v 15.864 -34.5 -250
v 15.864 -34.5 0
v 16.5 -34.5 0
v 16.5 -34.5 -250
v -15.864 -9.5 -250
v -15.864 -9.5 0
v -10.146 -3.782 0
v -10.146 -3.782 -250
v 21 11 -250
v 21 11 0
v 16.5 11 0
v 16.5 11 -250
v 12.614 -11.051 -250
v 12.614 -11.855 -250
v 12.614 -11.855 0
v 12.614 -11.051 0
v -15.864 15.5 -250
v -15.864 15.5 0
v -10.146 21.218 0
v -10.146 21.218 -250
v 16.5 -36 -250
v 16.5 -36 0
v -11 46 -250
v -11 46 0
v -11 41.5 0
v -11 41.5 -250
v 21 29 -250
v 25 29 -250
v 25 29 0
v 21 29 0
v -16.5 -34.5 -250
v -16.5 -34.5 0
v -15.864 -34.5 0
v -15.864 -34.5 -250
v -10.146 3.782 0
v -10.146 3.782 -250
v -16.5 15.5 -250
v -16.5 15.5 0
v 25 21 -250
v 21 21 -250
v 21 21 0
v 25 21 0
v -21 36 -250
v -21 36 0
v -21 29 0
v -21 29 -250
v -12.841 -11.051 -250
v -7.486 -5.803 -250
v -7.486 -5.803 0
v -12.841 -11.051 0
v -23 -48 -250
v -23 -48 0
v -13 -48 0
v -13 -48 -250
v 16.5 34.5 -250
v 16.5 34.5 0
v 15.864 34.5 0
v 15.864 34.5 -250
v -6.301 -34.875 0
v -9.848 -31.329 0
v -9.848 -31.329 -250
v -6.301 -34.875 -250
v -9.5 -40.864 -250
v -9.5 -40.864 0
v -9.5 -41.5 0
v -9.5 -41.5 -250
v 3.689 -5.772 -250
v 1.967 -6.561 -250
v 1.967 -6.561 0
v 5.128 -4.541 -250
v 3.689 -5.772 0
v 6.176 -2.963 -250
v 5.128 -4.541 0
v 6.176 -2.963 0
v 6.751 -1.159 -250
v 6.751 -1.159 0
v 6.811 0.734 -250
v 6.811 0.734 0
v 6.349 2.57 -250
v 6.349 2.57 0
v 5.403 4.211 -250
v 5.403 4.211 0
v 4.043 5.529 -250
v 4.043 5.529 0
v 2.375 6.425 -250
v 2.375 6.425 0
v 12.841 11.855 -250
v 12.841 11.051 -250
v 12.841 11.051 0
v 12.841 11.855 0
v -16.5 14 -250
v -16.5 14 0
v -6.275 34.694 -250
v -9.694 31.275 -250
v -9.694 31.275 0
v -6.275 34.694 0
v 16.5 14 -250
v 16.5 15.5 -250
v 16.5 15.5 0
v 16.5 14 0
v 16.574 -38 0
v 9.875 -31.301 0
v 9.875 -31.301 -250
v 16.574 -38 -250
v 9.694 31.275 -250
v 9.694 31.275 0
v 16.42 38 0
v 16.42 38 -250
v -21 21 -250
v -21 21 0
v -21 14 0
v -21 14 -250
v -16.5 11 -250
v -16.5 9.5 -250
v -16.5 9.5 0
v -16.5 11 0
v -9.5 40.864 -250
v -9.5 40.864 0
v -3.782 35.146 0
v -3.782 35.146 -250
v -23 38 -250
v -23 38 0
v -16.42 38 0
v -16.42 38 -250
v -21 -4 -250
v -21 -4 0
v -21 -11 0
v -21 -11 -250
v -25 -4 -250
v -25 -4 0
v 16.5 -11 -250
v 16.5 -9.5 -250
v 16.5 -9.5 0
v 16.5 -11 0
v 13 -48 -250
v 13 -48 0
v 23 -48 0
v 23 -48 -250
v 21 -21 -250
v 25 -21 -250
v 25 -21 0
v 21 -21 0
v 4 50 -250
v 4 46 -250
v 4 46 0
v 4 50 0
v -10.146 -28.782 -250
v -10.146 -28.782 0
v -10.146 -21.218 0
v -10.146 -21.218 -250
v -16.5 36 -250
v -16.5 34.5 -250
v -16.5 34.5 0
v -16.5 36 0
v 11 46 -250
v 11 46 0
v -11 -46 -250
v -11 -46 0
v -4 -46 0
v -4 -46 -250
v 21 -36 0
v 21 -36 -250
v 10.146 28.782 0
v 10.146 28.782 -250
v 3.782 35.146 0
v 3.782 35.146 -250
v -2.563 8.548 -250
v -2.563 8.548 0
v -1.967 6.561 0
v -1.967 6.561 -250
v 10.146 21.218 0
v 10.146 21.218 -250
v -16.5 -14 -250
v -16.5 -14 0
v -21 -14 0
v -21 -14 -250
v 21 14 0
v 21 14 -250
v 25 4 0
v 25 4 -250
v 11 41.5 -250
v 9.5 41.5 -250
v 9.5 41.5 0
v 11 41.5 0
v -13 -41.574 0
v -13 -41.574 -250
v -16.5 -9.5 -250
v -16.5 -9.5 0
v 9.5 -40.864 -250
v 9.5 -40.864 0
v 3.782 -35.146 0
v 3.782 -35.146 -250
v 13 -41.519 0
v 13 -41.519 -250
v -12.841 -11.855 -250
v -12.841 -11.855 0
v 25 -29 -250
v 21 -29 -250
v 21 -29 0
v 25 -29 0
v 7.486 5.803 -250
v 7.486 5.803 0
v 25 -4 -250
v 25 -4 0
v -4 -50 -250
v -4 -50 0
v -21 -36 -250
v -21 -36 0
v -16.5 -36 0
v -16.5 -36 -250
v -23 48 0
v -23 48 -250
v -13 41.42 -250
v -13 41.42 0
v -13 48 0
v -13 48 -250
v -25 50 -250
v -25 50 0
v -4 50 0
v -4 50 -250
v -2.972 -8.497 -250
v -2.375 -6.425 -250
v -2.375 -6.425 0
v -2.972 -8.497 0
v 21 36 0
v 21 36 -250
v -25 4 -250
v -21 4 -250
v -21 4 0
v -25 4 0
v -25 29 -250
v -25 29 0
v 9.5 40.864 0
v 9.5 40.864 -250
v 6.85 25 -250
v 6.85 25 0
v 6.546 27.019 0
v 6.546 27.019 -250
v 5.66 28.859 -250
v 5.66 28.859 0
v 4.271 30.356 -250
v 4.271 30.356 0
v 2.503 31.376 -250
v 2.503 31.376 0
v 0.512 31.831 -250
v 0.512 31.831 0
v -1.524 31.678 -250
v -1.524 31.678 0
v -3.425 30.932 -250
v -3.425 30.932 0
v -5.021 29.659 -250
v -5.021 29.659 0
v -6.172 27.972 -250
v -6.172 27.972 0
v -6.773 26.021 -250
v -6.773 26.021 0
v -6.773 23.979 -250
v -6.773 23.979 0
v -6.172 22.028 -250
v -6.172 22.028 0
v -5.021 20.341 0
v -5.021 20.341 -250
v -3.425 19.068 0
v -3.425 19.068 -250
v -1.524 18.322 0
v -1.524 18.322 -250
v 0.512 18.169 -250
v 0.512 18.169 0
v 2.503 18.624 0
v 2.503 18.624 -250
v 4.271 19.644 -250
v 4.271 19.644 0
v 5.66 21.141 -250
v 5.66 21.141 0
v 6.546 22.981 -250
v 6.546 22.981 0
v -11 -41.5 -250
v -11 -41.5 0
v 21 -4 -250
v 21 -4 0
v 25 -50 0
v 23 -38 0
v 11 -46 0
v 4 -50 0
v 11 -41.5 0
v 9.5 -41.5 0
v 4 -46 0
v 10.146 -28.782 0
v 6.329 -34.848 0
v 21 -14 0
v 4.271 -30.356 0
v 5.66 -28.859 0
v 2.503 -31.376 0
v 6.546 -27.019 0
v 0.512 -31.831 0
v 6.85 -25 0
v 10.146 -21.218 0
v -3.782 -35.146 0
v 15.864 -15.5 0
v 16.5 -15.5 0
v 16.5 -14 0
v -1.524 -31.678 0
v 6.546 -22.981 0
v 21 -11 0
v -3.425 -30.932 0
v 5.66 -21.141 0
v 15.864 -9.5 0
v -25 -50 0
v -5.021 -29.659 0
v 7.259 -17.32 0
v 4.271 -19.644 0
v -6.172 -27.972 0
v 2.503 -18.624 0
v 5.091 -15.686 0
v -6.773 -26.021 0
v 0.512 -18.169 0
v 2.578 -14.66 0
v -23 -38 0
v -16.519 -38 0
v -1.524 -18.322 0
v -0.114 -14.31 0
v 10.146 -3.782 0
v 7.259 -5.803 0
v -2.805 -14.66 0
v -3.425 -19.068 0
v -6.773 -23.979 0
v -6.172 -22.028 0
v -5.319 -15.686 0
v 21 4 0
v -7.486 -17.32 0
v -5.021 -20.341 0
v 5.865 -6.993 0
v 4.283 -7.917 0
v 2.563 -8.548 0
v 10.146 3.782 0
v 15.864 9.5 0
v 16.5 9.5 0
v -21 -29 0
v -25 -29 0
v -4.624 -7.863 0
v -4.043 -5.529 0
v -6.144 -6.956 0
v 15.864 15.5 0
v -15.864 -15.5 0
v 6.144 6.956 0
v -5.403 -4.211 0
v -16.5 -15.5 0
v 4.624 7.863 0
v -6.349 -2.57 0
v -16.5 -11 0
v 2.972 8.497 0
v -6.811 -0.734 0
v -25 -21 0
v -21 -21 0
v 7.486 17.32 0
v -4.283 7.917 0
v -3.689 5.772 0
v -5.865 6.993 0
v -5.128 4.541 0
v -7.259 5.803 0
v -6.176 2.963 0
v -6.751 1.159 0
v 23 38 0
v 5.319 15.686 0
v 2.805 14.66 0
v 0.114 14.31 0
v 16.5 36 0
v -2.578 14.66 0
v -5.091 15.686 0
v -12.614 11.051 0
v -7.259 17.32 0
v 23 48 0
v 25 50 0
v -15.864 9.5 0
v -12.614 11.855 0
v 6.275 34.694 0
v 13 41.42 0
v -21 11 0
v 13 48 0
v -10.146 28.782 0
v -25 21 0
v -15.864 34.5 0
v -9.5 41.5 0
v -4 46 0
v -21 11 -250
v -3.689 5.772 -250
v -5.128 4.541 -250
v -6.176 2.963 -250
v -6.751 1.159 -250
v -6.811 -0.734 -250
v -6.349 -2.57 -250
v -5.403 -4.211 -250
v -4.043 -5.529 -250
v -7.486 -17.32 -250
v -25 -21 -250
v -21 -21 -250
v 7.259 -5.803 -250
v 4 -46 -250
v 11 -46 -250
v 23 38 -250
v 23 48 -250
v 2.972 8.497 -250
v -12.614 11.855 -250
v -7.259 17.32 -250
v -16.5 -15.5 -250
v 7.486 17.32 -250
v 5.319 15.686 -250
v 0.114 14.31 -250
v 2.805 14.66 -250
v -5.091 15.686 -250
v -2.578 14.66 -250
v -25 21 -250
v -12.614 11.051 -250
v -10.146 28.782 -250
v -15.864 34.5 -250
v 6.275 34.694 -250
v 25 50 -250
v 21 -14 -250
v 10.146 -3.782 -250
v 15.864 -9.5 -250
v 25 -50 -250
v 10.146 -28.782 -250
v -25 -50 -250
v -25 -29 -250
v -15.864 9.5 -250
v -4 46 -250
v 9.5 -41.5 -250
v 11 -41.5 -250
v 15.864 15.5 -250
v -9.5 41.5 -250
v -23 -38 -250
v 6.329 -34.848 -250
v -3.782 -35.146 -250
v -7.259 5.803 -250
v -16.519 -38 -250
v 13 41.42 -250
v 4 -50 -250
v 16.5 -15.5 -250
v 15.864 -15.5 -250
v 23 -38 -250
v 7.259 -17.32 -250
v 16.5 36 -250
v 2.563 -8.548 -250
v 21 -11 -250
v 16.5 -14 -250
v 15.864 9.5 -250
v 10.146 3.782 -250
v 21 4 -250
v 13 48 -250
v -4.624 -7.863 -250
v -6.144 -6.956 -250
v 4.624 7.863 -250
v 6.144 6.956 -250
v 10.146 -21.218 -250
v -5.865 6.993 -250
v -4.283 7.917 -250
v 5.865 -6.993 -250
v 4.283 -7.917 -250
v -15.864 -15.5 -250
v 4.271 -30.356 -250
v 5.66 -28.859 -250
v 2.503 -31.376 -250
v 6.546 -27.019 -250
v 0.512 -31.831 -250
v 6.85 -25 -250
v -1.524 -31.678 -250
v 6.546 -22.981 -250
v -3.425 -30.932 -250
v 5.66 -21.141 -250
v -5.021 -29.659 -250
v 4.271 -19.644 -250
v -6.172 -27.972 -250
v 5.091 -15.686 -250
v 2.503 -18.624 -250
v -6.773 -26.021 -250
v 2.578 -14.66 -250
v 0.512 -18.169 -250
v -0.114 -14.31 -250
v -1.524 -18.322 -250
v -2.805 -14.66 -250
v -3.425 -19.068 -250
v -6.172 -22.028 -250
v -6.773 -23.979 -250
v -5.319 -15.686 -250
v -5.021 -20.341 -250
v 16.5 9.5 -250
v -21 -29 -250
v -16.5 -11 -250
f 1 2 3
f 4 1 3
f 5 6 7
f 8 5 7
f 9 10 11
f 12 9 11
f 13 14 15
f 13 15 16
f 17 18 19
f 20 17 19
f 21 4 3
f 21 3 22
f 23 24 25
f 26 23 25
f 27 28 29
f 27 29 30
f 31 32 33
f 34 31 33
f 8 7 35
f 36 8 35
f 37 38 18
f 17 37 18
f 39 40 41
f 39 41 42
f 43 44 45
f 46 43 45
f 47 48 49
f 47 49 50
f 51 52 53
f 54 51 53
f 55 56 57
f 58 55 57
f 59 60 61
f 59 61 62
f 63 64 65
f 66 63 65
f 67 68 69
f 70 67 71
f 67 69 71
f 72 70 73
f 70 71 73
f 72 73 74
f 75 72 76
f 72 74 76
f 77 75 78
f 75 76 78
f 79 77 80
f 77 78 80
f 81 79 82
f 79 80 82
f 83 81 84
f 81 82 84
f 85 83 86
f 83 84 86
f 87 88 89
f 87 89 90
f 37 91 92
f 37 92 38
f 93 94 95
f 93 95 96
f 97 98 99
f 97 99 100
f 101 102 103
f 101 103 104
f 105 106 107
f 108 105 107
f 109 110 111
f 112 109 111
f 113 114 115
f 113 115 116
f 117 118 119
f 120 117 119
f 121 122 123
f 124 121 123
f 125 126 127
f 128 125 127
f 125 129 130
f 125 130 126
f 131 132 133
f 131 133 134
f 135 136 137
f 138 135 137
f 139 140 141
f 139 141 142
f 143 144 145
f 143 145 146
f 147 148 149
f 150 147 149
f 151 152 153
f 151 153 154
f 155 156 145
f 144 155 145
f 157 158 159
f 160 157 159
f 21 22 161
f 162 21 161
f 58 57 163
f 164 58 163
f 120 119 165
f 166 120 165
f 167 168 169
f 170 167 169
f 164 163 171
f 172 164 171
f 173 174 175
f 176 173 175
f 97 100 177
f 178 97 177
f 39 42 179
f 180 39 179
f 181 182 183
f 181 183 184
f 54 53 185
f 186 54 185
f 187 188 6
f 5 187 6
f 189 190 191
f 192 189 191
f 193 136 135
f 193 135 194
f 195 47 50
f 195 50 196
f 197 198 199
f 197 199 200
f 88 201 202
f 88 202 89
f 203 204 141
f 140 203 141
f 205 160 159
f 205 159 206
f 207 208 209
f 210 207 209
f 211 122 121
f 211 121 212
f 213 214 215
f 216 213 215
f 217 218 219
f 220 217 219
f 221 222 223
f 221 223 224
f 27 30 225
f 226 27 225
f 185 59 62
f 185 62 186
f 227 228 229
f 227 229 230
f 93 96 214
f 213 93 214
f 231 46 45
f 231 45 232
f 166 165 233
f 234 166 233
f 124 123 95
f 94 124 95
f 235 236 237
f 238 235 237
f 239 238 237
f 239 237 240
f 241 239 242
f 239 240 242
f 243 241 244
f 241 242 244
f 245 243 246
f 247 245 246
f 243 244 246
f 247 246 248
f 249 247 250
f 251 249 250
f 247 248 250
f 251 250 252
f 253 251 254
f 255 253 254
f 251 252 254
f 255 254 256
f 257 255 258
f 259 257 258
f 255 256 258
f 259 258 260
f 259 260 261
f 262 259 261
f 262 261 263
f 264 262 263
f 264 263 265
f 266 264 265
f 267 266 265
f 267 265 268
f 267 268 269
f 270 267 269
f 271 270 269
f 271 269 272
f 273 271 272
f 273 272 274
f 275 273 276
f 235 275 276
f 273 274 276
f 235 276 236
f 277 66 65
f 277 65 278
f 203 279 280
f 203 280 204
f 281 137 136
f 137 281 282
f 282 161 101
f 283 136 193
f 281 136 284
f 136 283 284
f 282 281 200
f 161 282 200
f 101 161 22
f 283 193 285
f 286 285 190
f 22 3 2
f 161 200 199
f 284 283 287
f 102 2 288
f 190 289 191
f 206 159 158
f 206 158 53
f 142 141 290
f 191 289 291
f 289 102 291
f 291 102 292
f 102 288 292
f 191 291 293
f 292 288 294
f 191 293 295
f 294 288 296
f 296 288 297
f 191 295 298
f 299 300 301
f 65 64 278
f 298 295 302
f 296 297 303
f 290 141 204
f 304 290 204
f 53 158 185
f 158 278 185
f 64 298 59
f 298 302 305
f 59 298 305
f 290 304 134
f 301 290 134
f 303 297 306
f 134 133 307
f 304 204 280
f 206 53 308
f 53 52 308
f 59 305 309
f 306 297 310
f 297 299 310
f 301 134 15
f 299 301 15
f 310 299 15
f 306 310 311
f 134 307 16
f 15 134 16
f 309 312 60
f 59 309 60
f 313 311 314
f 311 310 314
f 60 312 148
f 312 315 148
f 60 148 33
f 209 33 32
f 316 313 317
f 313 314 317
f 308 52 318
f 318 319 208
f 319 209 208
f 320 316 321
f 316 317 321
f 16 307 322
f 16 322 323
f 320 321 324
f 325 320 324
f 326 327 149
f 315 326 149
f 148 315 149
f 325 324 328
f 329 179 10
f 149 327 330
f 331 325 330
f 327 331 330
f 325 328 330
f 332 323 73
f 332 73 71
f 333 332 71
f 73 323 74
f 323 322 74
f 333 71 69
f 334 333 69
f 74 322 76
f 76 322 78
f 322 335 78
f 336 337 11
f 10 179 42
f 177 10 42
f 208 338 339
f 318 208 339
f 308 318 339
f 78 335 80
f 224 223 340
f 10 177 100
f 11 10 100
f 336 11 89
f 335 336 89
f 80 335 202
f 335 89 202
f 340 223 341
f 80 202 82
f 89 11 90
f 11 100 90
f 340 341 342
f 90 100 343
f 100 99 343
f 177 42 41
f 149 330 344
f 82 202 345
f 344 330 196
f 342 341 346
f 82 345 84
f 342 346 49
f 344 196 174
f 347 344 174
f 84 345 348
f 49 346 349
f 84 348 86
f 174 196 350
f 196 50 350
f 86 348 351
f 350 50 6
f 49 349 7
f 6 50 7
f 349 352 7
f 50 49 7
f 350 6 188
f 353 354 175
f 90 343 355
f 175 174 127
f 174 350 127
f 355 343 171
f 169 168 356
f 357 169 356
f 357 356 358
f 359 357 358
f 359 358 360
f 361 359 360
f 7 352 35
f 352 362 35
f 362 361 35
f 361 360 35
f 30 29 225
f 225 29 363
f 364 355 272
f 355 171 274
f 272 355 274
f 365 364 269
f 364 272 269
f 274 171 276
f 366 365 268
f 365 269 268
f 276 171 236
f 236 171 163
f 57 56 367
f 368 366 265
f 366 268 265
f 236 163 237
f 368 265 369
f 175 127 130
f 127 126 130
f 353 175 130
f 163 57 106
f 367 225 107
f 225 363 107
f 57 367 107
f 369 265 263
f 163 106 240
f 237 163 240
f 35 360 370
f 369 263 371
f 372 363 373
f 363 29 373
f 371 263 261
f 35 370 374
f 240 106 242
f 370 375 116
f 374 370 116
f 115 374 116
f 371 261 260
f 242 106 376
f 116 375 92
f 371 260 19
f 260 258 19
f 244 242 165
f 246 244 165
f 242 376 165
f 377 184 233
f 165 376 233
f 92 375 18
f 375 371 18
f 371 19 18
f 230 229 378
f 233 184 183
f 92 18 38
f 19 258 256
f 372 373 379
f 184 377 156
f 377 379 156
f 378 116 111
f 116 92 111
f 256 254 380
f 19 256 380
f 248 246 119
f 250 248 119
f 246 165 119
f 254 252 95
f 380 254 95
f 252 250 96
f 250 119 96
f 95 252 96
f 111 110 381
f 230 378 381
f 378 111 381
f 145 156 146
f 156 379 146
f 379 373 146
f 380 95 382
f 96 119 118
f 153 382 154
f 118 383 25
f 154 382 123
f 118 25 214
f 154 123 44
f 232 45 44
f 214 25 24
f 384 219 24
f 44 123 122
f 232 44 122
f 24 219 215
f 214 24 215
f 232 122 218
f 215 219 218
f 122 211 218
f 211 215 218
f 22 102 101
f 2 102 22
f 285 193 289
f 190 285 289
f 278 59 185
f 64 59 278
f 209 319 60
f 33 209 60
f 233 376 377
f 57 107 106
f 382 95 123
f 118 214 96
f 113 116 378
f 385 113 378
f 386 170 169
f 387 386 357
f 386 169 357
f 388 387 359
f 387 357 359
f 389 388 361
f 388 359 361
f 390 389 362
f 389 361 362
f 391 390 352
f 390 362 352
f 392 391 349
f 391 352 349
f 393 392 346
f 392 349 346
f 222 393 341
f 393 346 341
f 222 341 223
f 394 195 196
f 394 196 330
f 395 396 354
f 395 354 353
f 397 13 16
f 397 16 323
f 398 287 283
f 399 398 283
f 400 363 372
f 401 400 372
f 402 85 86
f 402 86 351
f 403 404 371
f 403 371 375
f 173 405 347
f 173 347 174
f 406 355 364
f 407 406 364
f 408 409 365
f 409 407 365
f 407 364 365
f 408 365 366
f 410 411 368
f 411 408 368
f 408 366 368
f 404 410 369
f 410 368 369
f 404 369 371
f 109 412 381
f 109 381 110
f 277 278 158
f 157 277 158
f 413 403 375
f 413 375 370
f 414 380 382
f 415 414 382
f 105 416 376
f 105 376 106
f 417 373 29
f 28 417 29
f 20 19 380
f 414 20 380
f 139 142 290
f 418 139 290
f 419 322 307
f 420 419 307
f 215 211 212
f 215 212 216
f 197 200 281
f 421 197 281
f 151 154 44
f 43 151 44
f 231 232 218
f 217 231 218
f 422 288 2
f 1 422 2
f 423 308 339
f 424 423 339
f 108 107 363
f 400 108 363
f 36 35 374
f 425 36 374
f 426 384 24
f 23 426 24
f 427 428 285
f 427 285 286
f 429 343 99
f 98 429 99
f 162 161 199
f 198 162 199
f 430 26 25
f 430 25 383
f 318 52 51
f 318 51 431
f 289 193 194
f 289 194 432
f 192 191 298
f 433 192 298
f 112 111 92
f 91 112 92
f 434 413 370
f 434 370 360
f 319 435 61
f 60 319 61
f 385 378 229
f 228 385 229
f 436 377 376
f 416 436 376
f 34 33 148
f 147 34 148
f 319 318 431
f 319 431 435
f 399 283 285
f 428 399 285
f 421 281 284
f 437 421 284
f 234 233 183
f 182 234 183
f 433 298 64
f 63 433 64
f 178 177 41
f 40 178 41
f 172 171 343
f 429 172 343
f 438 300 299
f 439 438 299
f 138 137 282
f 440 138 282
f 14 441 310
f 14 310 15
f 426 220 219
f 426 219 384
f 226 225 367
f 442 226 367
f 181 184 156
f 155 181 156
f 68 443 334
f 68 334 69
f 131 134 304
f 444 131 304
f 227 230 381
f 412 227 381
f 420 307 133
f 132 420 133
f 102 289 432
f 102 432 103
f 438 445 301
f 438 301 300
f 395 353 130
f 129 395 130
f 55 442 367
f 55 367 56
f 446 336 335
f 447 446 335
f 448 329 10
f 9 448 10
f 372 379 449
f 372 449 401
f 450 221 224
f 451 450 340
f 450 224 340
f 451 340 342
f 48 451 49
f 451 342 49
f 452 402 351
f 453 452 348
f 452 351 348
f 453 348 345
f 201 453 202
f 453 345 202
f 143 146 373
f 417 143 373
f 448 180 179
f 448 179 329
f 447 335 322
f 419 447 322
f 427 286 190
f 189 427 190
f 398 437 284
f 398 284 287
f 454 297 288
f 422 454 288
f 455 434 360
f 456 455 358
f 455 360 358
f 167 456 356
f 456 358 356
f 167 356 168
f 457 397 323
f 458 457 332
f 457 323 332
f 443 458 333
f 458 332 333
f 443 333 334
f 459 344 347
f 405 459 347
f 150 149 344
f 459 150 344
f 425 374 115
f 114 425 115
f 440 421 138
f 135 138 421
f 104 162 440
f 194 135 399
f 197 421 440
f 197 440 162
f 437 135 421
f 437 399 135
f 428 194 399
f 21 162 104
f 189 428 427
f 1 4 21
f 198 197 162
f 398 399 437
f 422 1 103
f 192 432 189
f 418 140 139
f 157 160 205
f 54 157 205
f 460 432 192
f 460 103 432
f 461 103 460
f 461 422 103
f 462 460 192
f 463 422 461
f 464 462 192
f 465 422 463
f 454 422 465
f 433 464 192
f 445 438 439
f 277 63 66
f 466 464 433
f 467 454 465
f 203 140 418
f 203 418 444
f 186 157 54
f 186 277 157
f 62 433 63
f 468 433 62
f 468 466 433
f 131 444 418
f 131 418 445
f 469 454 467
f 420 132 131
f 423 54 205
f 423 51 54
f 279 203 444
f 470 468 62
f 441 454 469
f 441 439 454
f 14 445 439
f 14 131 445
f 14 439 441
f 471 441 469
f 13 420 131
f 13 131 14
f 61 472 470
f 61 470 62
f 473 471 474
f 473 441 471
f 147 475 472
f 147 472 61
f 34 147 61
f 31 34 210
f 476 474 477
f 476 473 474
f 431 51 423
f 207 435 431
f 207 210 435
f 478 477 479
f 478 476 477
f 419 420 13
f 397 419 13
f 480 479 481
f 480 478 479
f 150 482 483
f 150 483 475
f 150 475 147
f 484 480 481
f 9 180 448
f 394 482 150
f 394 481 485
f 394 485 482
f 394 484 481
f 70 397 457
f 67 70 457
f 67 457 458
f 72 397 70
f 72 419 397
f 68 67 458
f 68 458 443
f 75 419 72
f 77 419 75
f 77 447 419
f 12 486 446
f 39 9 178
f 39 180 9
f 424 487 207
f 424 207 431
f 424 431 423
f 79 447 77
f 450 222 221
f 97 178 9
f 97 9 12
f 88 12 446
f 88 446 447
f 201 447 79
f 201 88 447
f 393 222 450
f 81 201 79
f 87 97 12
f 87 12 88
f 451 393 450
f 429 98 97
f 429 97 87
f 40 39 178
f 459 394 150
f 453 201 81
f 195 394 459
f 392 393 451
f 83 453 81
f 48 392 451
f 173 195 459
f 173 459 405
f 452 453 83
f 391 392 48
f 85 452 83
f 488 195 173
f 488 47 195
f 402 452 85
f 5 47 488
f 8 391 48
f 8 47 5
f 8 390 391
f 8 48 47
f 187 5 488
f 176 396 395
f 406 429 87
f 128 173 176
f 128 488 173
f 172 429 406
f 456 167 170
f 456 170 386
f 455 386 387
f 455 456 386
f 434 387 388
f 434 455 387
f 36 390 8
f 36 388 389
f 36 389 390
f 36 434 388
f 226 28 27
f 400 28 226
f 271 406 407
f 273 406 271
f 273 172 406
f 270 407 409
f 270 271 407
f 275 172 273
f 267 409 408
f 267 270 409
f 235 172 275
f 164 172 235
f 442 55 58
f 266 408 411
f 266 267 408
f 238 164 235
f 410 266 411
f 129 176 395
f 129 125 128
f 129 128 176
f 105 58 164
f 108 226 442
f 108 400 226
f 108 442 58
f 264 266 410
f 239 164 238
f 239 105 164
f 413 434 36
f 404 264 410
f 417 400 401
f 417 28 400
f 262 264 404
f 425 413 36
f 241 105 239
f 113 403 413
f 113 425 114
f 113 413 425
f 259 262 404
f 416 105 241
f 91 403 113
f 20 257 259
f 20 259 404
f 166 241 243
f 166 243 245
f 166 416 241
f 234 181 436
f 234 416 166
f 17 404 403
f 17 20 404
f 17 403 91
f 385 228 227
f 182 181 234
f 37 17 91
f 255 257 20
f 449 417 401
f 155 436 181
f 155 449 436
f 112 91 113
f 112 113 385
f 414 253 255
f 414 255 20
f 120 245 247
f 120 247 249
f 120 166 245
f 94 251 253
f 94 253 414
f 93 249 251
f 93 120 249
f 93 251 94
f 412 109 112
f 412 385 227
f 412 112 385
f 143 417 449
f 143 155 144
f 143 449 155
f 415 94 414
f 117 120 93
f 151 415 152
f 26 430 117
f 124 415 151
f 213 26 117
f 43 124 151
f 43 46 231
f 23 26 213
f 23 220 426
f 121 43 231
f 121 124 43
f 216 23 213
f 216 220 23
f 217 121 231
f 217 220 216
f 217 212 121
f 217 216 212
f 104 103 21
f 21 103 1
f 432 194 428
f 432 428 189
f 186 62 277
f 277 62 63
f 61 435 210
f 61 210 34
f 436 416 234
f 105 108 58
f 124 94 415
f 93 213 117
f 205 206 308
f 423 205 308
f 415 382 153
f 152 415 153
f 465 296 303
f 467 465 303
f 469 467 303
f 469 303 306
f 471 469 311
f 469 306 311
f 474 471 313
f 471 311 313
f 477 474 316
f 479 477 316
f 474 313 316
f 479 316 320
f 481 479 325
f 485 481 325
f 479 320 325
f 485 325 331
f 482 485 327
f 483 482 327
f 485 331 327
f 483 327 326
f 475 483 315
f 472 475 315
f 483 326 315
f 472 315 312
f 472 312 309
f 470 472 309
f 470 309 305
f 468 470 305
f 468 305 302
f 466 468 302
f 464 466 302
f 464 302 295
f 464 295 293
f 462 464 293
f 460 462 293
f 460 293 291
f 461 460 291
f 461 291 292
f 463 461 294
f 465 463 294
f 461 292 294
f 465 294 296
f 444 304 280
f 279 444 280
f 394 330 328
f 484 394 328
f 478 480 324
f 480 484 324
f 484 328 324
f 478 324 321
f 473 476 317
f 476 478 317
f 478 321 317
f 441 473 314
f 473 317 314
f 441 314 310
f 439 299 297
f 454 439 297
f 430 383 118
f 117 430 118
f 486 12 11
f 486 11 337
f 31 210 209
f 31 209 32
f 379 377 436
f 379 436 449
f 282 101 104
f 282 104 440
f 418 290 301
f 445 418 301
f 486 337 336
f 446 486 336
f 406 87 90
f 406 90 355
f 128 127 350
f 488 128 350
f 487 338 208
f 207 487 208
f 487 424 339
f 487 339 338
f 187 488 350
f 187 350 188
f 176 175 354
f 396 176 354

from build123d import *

# Parameters (mm, degrees)
SKETCH_A01_2_R     = 6.849979581
SKETCH_A01_2_R_2   = 6.85
SKETCH_A01_2_W     = 10
SKETCH_A01_2_H     = 10
EXTRUDE1_DEPTH     = 250
CUT_EXTRUDE1_DEPTH = 251
CIRPATTERN1_COUNT  = 2
CUT_EXTRUDE2_DEPTH = 251
CUT_EXTRUDE3_DEPTH = 251
CIRPATTERN2_COUNT  = 2
CIRPATTERN2_ANGLE  = 270
CIRPATTERN3_COUNT  = 2
CIRPATTERN3_ANGLE  = 90


with BuildPart() as part:
    # Sketch A01-2 → Extrude1 (new body)
    with BuildSketch(Plane.XY):
        Polygon((-16.5, -36), (-16.5, -34.5), (-15.863961, -34.5), (-10.14602885, -28.78206785), (-10.14602885, -21.21793215), (-15.863961, -15.5), (-16.5, -15.5), (-16.5, -14), (-21, -14), (-21, -21), (-25, -21), (-25, -4), (-21, -4), (-21, -11), (-16.5, -11), (-16.5, -9.5), (-15.863961, -9.5), (-10.14602885, -3.78206785), (-10.14602885, 3.78206785), (-15.863961, 9.5), (-16.5, 9.5), (-16.5, 11), (-21, 11), (-21, 4), (-25, 4), (-25, 21), (-21, 21), (-21, 14), (-16.5, 14), (-16.5, 15.5), (-15.863961, 15.5), (-10.14602885, 21.21793215), (-10.14602885, 28.78206785), (-15.863961, 34.5), (-16.5, 34.5), (-16.5, 36), (-21, 36), (-21, 29), (-25, 29), (-25, 50), (-4, 50), (-4, 46), (-11, 46), (-11, 41.5), (-9.5, 41.5), (-9.5, 40.863961), (-3.78206785, 35.14602885), (3.78206785, 35.14602885), (9.5, 40.863961), (9.5, 41.5), (11, 41.5), (11, 46), (4, 46), (4, 50), (25, 50), (25, 29), (21, 29), (21, 36), (16.5, 36), (16.5, 34.5), (15.863961, 34.5), (10.14602885, 28.78206785), (10.14602885, 21.21793215), (15.863961, 15.5), (16.5, 15.5), (16.5, 14), (21, 14), (21, 21), (25, 21), (25, 4), (21, 4), (21, 11), (16.5, 11), (16.5, 9.5), (15.863961, 9.5), (10.14602885, 3.78206785), (10.14602885, -3.78206785), (15.863961, -9.5), (16.5, -9.5), (16.5, -11), (21, -11), (21, -4), (25, -4), (25, -21), (21, -21), (21, -14), (16.5, -14), (16.5, -15.5), (15.863961, -15.5), (10.14602885, -21.21793215), (10.14602885, -28.78206785), (15.863961, -34.5), (16.5, -34.5), (16.5, -36), (21, -36), (21, -29), (25, -29), (25, -50), (4, -50), (4, -46), (11, -46), (11, -41.5), (9.5, -41.5), (9.5, -40.863961), (3.78206785, -35.14602885), (-3.78206785, -35.14602885), (-9.5, -40.863961), (-9.5, -41.5), (-11, -41.5), (-11, -46), (-4, -46), (-4, -50), (-25, -50), (-25, -29), (-21, -29), (-21, -36), align=None)
        Circle(SKETCH_A01_2_R, mode=Mode.SUBTRACT)
        with Locations((0, -25)):
            Circle(SKETCH_A01_2_R_2, mode=Mode.SUBTRACT)
        with Locations((0, 25)):
            Circle(SKETCH_A01_2_R, mode=Mode.SUBTRACT)
        with Locations((-18, -43)):
            Rectangle(SKETCH_A01_2_W, SKETCH_A01_2_H, mode=Mode.SUBTRACT)
        with Locations((18, -43)):
            Rectangle(SKETCH_A01_2_W, SKETCH_A01_2_H, mode=Mode.SUBTRACT)
        with Locations((-18, 43)):
            Rectangle(SKETCH_A01_2_W, SKETCH_A01_2_H, mode=Mode.SUBTRACT)
        with Locations((18, 43)):
            Rectangle(SKETCH_A01_2_W, SKETCH_A01_2_H, mode=Mode.SUBTRACT)
    extrude(amount=-EXTRUDE1_DEPTH)

    # Sketch1 → Cut-Extrude1 (cut, through all)
    with BuildSketch(Plane.XY):
        with BuildLine():
            Line((-7.258795353, 17.320361918), (-12.614234198, 11.855428431))
            Line((-12.614234198, 11.855428431), (-12.614234198, 11.051418253))
            Line((-12.614234198, 11.051418253), (-7.258795353, 5.803280231))
            ThreePointArc((-7.258795353, 5.803280231), (-5.094968204, 7.490334338), (-2.563122733, 8.547716957))
            Line((-2.563122733, 8.547716957), (-1.967487438, 6.56134235))
            ThreePointArc((-1.967487438, 6.56134235), (0.214842487, 6.846609596), (2.374993487, 6.425077913))
            Line((2.374993487, 6.425077913), (2.972164568, 8.497096186))
            ThreePointArc((2.972164568, 8.497096186), (5.403413421, 7.442330952), (7.485963159, 5.803280231))
            Line((7.485963159, 5.803280231), (12.841402004, 11.051418253))
            Line((12.841402004, 11.051418253), (12.841402004, 11.855428431))
            Line((12.841402004, 11.855428431), (7.485963159, 17.320361918))
            ThreePointArc((7.485963159, 17.320361918), (0.113583903, 14.310231562), (-7.258795353, 17.320361918))
        make_face()
    cut_extrude1 = extrude(amount=-CUT_EXTRUDE1_DEPTH, mode=Mode.SUBTRACT)

    # CirPattern1: Cut-Extrude1 ×2 about axis
    cirpattern1_axis = Axis((0, 0, 0), (0, 0, 1))
    for i in range(1, CIRPATTERN1_COUNT):
        add(cut_extrude1.rotate(cirpattern1_axis, i * 360 / CIRPATTERN1_COUNT), mode=Mode.SUBTRACT)

    # Sketch2 → Cut-Extrude2 (cut, through all)
    with BuildSketch(Plane.XY):
        Polygon((-16.419523035, 38), (-9.694317474, 31.274794439), (-6.274794439, 34.694317474), (-13, 41.419523035), align=None)
    cut_extrude2 = extrude(amount=-CUT_EXTRUDE2_DEPTH, mode=Mode.SUBTRACT)

    # Sketch3 → Cut-Extrude3 (cut, through all)
    with BuildSketch(Plane.XY):
        Polygon((-16.519090004, -38), (-9.847797296, -31.328707292), (-6.301034305, -34.875470283), (-13, -41.574435978), align=None)
    cut_extrude3 = extrude(amount=-CUT_EXTRUDE3_DEPTH, mode=Mode.SUBTRACT)

    # CirPattern2: Cut-Extrude2 ×2 about axis
    cirpattern2_axis = Axis((0, 25, 0), (0, 0, 1))
    for i in range(1, CIRPATTERN2_COUNT):
        add(cut_extrude2.rotate(cirpattern2_axis, i * CIRPATTERN2_ANGLE / (CIRPATTERN2_COUNT - 1)), mode=Mode.SUBTRACT)

    # CirPattern3: Cut-Extrude3 ×2 about axis
    cirpattern3_axis = Axis((0, -25, 0), (0, 0, 1))
    for i in range(1, CIRPATTERN3_COUNT):
        add(cut_extrude3.rotate(cirpattern3_axis, i * CIRPATTERN3_ANGLE / (CIRPATTERN3_COUNT - 1)), mode=Mode.SUBTRACT)


solid = part.part
